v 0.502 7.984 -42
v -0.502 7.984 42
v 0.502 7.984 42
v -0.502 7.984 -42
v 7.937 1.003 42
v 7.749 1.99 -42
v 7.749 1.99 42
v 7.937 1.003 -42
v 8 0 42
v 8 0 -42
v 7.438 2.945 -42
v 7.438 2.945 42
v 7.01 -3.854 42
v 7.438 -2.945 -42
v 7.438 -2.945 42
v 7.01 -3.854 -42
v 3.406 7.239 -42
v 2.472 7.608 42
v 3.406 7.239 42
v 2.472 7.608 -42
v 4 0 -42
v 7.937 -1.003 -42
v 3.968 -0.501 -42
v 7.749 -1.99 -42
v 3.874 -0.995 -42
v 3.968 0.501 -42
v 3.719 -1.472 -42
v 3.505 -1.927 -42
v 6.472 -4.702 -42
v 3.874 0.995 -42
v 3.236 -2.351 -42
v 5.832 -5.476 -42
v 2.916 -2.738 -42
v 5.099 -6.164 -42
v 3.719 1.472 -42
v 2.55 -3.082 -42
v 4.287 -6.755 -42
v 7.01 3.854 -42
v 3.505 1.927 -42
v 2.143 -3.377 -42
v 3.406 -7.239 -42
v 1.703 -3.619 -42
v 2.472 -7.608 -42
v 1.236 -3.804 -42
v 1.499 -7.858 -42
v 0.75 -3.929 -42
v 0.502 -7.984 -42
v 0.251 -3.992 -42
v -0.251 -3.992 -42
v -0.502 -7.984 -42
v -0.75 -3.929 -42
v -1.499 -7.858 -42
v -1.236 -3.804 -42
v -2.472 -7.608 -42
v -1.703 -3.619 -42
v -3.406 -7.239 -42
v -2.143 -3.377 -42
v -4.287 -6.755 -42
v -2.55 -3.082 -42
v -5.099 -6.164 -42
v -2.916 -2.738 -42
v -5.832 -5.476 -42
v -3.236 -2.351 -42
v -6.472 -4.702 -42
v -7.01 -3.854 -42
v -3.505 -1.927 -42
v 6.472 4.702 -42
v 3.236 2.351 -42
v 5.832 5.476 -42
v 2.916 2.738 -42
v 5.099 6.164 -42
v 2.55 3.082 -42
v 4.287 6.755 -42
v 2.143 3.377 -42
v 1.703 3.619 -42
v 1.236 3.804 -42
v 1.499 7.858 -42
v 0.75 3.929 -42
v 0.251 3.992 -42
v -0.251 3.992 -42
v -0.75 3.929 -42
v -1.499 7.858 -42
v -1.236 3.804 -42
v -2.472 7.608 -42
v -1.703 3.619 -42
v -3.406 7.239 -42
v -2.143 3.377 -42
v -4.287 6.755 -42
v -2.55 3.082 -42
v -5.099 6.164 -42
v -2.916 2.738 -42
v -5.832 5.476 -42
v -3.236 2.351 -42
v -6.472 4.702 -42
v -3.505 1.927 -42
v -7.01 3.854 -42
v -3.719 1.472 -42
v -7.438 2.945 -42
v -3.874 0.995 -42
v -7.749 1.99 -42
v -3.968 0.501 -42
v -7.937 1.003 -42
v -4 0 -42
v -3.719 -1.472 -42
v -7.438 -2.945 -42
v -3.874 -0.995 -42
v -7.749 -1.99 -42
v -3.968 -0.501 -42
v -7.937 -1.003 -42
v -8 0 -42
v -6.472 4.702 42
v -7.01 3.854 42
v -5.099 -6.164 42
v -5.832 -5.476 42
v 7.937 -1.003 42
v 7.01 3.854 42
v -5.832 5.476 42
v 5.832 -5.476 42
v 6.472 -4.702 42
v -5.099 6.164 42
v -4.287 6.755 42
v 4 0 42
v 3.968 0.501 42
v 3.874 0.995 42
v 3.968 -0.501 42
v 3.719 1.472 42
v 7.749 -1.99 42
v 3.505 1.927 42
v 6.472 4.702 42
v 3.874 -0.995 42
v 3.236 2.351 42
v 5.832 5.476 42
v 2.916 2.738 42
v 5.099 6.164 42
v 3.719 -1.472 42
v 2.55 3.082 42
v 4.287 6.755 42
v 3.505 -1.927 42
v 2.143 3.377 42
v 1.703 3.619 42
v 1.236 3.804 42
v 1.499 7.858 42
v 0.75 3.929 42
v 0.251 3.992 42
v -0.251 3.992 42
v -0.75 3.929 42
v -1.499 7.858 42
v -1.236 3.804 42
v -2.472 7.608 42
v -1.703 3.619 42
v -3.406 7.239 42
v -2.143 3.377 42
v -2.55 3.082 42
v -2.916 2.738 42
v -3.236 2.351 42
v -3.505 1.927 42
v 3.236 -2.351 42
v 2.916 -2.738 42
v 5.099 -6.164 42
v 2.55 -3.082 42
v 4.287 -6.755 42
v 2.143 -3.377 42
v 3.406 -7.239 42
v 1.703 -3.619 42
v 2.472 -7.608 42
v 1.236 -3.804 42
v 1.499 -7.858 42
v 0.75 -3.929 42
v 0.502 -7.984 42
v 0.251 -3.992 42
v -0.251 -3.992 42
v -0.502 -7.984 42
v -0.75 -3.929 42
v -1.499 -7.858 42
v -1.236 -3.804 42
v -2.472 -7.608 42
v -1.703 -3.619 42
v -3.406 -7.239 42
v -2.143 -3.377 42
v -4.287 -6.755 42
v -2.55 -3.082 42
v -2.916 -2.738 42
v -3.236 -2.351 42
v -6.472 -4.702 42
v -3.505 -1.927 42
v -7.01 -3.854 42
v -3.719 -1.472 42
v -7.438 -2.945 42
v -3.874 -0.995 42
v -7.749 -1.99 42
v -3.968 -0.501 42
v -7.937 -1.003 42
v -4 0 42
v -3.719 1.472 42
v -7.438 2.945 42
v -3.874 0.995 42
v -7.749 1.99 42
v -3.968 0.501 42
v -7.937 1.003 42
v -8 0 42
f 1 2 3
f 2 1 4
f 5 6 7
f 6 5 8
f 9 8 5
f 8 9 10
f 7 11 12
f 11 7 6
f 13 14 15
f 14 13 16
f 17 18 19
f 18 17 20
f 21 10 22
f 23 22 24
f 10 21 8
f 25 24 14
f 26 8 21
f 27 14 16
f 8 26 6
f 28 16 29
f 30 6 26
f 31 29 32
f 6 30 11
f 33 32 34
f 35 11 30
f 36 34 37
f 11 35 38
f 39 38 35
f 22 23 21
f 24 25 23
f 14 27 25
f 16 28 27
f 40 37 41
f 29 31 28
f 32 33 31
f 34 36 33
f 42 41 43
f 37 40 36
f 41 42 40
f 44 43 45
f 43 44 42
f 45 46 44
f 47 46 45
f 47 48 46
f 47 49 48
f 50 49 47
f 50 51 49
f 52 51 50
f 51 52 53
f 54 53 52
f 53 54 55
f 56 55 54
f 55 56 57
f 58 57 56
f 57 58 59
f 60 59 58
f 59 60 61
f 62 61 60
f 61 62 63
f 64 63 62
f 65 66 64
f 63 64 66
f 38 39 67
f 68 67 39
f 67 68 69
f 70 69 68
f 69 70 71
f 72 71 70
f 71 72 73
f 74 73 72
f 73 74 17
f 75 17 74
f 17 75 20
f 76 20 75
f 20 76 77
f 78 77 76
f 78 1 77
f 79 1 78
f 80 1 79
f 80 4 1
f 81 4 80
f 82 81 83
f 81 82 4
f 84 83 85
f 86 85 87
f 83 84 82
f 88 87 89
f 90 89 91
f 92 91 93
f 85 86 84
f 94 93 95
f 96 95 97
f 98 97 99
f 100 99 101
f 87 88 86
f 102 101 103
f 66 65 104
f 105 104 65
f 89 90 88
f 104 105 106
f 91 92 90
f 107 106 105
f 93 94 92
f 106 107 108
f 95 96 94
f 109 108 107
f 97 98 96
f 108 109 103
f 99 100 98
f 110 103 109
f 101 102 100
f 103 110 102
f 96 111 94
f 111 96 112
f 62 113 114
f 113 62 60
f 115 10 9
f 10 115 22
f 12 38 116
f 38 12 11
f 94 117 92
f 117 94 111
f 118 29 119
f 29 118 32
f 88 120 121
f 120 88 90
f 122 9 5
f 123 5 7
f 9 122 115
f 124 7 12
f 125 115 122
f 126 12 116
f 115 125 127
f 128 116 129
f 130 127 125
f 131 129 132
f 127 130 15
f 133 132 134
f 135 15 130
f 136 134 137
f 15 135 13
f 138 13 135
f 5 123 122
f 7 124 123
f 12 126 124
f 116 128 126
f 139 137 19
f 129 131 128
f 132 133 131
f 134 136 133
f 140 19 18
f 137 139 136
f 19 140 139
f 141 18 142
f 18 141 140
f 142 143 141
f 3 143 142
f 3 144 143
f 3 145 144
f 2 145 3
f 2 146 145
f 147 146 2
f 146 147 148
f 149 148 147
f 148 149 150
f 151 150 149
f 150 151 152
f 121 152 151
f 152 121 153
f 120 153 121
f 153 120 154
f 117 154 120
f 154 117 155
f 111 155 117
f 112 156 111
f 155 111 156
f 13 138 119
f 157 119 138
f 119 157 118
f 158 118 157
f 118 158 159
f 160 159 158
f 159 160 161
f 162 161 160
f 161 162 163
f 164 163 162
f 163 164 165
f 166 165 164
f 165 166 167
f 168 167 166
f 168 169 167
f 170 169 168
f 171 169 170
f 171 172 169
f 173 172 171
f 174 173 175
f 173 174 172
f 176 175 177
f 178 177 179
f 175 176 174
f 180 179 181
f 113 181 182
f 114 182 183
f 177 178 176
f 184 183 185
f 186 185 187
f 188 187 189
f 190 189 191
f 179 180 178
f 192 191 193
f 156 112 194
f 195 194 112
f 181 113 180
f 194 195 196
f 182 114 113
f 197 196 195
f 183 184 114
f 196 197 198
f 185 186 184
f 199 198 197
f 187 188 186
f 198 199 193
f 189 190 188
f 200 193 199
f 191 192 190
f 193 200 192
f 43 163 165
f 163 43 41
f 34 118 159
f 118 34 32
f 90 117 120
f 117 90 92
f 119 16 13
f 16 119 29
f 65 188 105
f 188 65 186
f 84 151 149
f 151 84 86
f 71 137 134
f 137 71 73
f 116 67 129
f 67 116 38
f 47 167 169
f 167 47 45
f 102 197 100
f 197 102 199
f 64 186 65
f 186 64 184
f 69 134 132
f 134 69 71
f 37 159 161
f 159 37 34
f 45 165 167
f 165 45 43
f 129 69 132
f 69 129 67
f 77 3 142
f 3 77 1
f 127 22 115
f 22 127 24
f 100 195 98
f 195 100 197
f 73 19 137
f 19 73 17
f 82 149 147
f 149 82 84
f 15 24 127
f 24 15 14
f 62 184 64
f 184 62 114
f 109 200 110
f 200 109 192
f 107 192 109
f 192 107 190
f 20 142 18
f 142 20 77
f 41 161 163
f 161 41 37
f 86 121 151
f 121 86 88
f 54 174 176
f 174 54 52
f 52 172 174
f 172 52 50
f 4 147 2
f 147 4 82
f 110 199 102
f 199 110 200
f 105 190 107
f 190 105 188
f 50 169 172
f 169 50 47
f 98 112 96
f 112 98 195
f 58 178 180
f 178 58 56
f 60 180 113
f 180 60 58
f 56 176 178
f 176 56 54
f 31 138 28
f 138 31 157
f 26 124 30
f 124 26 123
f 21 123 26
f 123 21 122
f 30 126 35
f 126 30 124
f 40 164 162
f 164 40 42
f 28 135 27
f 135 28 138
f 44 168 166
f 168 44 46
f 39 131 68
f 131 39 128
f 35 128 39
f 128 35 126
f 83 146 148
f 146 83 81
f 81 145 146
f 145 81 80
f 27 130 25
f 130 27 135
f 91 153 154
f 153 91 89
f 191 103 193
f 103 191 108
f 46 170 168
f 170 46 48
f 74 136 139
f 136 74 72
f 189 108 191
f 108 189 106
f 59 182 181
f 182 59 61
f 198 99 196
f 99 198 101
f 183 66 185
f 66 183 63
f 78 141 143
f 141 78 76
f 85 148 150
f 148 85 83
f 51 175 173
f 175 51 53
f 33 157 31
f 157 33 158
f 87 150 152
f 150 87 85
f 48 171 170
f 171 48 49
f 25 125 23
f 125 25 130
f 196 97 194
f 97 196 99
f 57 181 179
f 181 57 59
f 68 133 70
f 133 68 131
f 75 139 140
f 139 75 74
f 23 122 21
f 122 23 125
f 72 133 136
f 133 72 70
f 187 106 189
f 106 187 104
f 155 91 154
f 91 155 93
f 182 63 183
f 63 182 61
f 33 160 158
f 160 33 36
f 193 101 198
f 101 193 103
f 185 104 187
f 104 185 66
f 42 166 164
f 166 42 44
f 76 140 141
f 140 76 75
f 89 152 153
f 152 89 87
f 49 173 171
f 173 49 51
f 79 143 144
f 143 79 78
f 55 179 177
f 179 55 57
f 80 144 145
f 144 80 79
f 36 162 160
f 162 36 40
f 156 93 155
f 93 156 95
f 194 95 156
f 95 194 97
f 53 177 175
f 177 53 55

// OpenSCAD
$fn = 50;


difference() {
	union() {
		translate(v = [0, 0, -42.0000000000]) {
			cylinder(h = 84, r = 8.0000000000);
		}
	}
	union() {
		translate(v = [0, 0, -100.0000000000]) {
			cylinder(h = 200, r = 4.0000000000);
		}
	}
}
